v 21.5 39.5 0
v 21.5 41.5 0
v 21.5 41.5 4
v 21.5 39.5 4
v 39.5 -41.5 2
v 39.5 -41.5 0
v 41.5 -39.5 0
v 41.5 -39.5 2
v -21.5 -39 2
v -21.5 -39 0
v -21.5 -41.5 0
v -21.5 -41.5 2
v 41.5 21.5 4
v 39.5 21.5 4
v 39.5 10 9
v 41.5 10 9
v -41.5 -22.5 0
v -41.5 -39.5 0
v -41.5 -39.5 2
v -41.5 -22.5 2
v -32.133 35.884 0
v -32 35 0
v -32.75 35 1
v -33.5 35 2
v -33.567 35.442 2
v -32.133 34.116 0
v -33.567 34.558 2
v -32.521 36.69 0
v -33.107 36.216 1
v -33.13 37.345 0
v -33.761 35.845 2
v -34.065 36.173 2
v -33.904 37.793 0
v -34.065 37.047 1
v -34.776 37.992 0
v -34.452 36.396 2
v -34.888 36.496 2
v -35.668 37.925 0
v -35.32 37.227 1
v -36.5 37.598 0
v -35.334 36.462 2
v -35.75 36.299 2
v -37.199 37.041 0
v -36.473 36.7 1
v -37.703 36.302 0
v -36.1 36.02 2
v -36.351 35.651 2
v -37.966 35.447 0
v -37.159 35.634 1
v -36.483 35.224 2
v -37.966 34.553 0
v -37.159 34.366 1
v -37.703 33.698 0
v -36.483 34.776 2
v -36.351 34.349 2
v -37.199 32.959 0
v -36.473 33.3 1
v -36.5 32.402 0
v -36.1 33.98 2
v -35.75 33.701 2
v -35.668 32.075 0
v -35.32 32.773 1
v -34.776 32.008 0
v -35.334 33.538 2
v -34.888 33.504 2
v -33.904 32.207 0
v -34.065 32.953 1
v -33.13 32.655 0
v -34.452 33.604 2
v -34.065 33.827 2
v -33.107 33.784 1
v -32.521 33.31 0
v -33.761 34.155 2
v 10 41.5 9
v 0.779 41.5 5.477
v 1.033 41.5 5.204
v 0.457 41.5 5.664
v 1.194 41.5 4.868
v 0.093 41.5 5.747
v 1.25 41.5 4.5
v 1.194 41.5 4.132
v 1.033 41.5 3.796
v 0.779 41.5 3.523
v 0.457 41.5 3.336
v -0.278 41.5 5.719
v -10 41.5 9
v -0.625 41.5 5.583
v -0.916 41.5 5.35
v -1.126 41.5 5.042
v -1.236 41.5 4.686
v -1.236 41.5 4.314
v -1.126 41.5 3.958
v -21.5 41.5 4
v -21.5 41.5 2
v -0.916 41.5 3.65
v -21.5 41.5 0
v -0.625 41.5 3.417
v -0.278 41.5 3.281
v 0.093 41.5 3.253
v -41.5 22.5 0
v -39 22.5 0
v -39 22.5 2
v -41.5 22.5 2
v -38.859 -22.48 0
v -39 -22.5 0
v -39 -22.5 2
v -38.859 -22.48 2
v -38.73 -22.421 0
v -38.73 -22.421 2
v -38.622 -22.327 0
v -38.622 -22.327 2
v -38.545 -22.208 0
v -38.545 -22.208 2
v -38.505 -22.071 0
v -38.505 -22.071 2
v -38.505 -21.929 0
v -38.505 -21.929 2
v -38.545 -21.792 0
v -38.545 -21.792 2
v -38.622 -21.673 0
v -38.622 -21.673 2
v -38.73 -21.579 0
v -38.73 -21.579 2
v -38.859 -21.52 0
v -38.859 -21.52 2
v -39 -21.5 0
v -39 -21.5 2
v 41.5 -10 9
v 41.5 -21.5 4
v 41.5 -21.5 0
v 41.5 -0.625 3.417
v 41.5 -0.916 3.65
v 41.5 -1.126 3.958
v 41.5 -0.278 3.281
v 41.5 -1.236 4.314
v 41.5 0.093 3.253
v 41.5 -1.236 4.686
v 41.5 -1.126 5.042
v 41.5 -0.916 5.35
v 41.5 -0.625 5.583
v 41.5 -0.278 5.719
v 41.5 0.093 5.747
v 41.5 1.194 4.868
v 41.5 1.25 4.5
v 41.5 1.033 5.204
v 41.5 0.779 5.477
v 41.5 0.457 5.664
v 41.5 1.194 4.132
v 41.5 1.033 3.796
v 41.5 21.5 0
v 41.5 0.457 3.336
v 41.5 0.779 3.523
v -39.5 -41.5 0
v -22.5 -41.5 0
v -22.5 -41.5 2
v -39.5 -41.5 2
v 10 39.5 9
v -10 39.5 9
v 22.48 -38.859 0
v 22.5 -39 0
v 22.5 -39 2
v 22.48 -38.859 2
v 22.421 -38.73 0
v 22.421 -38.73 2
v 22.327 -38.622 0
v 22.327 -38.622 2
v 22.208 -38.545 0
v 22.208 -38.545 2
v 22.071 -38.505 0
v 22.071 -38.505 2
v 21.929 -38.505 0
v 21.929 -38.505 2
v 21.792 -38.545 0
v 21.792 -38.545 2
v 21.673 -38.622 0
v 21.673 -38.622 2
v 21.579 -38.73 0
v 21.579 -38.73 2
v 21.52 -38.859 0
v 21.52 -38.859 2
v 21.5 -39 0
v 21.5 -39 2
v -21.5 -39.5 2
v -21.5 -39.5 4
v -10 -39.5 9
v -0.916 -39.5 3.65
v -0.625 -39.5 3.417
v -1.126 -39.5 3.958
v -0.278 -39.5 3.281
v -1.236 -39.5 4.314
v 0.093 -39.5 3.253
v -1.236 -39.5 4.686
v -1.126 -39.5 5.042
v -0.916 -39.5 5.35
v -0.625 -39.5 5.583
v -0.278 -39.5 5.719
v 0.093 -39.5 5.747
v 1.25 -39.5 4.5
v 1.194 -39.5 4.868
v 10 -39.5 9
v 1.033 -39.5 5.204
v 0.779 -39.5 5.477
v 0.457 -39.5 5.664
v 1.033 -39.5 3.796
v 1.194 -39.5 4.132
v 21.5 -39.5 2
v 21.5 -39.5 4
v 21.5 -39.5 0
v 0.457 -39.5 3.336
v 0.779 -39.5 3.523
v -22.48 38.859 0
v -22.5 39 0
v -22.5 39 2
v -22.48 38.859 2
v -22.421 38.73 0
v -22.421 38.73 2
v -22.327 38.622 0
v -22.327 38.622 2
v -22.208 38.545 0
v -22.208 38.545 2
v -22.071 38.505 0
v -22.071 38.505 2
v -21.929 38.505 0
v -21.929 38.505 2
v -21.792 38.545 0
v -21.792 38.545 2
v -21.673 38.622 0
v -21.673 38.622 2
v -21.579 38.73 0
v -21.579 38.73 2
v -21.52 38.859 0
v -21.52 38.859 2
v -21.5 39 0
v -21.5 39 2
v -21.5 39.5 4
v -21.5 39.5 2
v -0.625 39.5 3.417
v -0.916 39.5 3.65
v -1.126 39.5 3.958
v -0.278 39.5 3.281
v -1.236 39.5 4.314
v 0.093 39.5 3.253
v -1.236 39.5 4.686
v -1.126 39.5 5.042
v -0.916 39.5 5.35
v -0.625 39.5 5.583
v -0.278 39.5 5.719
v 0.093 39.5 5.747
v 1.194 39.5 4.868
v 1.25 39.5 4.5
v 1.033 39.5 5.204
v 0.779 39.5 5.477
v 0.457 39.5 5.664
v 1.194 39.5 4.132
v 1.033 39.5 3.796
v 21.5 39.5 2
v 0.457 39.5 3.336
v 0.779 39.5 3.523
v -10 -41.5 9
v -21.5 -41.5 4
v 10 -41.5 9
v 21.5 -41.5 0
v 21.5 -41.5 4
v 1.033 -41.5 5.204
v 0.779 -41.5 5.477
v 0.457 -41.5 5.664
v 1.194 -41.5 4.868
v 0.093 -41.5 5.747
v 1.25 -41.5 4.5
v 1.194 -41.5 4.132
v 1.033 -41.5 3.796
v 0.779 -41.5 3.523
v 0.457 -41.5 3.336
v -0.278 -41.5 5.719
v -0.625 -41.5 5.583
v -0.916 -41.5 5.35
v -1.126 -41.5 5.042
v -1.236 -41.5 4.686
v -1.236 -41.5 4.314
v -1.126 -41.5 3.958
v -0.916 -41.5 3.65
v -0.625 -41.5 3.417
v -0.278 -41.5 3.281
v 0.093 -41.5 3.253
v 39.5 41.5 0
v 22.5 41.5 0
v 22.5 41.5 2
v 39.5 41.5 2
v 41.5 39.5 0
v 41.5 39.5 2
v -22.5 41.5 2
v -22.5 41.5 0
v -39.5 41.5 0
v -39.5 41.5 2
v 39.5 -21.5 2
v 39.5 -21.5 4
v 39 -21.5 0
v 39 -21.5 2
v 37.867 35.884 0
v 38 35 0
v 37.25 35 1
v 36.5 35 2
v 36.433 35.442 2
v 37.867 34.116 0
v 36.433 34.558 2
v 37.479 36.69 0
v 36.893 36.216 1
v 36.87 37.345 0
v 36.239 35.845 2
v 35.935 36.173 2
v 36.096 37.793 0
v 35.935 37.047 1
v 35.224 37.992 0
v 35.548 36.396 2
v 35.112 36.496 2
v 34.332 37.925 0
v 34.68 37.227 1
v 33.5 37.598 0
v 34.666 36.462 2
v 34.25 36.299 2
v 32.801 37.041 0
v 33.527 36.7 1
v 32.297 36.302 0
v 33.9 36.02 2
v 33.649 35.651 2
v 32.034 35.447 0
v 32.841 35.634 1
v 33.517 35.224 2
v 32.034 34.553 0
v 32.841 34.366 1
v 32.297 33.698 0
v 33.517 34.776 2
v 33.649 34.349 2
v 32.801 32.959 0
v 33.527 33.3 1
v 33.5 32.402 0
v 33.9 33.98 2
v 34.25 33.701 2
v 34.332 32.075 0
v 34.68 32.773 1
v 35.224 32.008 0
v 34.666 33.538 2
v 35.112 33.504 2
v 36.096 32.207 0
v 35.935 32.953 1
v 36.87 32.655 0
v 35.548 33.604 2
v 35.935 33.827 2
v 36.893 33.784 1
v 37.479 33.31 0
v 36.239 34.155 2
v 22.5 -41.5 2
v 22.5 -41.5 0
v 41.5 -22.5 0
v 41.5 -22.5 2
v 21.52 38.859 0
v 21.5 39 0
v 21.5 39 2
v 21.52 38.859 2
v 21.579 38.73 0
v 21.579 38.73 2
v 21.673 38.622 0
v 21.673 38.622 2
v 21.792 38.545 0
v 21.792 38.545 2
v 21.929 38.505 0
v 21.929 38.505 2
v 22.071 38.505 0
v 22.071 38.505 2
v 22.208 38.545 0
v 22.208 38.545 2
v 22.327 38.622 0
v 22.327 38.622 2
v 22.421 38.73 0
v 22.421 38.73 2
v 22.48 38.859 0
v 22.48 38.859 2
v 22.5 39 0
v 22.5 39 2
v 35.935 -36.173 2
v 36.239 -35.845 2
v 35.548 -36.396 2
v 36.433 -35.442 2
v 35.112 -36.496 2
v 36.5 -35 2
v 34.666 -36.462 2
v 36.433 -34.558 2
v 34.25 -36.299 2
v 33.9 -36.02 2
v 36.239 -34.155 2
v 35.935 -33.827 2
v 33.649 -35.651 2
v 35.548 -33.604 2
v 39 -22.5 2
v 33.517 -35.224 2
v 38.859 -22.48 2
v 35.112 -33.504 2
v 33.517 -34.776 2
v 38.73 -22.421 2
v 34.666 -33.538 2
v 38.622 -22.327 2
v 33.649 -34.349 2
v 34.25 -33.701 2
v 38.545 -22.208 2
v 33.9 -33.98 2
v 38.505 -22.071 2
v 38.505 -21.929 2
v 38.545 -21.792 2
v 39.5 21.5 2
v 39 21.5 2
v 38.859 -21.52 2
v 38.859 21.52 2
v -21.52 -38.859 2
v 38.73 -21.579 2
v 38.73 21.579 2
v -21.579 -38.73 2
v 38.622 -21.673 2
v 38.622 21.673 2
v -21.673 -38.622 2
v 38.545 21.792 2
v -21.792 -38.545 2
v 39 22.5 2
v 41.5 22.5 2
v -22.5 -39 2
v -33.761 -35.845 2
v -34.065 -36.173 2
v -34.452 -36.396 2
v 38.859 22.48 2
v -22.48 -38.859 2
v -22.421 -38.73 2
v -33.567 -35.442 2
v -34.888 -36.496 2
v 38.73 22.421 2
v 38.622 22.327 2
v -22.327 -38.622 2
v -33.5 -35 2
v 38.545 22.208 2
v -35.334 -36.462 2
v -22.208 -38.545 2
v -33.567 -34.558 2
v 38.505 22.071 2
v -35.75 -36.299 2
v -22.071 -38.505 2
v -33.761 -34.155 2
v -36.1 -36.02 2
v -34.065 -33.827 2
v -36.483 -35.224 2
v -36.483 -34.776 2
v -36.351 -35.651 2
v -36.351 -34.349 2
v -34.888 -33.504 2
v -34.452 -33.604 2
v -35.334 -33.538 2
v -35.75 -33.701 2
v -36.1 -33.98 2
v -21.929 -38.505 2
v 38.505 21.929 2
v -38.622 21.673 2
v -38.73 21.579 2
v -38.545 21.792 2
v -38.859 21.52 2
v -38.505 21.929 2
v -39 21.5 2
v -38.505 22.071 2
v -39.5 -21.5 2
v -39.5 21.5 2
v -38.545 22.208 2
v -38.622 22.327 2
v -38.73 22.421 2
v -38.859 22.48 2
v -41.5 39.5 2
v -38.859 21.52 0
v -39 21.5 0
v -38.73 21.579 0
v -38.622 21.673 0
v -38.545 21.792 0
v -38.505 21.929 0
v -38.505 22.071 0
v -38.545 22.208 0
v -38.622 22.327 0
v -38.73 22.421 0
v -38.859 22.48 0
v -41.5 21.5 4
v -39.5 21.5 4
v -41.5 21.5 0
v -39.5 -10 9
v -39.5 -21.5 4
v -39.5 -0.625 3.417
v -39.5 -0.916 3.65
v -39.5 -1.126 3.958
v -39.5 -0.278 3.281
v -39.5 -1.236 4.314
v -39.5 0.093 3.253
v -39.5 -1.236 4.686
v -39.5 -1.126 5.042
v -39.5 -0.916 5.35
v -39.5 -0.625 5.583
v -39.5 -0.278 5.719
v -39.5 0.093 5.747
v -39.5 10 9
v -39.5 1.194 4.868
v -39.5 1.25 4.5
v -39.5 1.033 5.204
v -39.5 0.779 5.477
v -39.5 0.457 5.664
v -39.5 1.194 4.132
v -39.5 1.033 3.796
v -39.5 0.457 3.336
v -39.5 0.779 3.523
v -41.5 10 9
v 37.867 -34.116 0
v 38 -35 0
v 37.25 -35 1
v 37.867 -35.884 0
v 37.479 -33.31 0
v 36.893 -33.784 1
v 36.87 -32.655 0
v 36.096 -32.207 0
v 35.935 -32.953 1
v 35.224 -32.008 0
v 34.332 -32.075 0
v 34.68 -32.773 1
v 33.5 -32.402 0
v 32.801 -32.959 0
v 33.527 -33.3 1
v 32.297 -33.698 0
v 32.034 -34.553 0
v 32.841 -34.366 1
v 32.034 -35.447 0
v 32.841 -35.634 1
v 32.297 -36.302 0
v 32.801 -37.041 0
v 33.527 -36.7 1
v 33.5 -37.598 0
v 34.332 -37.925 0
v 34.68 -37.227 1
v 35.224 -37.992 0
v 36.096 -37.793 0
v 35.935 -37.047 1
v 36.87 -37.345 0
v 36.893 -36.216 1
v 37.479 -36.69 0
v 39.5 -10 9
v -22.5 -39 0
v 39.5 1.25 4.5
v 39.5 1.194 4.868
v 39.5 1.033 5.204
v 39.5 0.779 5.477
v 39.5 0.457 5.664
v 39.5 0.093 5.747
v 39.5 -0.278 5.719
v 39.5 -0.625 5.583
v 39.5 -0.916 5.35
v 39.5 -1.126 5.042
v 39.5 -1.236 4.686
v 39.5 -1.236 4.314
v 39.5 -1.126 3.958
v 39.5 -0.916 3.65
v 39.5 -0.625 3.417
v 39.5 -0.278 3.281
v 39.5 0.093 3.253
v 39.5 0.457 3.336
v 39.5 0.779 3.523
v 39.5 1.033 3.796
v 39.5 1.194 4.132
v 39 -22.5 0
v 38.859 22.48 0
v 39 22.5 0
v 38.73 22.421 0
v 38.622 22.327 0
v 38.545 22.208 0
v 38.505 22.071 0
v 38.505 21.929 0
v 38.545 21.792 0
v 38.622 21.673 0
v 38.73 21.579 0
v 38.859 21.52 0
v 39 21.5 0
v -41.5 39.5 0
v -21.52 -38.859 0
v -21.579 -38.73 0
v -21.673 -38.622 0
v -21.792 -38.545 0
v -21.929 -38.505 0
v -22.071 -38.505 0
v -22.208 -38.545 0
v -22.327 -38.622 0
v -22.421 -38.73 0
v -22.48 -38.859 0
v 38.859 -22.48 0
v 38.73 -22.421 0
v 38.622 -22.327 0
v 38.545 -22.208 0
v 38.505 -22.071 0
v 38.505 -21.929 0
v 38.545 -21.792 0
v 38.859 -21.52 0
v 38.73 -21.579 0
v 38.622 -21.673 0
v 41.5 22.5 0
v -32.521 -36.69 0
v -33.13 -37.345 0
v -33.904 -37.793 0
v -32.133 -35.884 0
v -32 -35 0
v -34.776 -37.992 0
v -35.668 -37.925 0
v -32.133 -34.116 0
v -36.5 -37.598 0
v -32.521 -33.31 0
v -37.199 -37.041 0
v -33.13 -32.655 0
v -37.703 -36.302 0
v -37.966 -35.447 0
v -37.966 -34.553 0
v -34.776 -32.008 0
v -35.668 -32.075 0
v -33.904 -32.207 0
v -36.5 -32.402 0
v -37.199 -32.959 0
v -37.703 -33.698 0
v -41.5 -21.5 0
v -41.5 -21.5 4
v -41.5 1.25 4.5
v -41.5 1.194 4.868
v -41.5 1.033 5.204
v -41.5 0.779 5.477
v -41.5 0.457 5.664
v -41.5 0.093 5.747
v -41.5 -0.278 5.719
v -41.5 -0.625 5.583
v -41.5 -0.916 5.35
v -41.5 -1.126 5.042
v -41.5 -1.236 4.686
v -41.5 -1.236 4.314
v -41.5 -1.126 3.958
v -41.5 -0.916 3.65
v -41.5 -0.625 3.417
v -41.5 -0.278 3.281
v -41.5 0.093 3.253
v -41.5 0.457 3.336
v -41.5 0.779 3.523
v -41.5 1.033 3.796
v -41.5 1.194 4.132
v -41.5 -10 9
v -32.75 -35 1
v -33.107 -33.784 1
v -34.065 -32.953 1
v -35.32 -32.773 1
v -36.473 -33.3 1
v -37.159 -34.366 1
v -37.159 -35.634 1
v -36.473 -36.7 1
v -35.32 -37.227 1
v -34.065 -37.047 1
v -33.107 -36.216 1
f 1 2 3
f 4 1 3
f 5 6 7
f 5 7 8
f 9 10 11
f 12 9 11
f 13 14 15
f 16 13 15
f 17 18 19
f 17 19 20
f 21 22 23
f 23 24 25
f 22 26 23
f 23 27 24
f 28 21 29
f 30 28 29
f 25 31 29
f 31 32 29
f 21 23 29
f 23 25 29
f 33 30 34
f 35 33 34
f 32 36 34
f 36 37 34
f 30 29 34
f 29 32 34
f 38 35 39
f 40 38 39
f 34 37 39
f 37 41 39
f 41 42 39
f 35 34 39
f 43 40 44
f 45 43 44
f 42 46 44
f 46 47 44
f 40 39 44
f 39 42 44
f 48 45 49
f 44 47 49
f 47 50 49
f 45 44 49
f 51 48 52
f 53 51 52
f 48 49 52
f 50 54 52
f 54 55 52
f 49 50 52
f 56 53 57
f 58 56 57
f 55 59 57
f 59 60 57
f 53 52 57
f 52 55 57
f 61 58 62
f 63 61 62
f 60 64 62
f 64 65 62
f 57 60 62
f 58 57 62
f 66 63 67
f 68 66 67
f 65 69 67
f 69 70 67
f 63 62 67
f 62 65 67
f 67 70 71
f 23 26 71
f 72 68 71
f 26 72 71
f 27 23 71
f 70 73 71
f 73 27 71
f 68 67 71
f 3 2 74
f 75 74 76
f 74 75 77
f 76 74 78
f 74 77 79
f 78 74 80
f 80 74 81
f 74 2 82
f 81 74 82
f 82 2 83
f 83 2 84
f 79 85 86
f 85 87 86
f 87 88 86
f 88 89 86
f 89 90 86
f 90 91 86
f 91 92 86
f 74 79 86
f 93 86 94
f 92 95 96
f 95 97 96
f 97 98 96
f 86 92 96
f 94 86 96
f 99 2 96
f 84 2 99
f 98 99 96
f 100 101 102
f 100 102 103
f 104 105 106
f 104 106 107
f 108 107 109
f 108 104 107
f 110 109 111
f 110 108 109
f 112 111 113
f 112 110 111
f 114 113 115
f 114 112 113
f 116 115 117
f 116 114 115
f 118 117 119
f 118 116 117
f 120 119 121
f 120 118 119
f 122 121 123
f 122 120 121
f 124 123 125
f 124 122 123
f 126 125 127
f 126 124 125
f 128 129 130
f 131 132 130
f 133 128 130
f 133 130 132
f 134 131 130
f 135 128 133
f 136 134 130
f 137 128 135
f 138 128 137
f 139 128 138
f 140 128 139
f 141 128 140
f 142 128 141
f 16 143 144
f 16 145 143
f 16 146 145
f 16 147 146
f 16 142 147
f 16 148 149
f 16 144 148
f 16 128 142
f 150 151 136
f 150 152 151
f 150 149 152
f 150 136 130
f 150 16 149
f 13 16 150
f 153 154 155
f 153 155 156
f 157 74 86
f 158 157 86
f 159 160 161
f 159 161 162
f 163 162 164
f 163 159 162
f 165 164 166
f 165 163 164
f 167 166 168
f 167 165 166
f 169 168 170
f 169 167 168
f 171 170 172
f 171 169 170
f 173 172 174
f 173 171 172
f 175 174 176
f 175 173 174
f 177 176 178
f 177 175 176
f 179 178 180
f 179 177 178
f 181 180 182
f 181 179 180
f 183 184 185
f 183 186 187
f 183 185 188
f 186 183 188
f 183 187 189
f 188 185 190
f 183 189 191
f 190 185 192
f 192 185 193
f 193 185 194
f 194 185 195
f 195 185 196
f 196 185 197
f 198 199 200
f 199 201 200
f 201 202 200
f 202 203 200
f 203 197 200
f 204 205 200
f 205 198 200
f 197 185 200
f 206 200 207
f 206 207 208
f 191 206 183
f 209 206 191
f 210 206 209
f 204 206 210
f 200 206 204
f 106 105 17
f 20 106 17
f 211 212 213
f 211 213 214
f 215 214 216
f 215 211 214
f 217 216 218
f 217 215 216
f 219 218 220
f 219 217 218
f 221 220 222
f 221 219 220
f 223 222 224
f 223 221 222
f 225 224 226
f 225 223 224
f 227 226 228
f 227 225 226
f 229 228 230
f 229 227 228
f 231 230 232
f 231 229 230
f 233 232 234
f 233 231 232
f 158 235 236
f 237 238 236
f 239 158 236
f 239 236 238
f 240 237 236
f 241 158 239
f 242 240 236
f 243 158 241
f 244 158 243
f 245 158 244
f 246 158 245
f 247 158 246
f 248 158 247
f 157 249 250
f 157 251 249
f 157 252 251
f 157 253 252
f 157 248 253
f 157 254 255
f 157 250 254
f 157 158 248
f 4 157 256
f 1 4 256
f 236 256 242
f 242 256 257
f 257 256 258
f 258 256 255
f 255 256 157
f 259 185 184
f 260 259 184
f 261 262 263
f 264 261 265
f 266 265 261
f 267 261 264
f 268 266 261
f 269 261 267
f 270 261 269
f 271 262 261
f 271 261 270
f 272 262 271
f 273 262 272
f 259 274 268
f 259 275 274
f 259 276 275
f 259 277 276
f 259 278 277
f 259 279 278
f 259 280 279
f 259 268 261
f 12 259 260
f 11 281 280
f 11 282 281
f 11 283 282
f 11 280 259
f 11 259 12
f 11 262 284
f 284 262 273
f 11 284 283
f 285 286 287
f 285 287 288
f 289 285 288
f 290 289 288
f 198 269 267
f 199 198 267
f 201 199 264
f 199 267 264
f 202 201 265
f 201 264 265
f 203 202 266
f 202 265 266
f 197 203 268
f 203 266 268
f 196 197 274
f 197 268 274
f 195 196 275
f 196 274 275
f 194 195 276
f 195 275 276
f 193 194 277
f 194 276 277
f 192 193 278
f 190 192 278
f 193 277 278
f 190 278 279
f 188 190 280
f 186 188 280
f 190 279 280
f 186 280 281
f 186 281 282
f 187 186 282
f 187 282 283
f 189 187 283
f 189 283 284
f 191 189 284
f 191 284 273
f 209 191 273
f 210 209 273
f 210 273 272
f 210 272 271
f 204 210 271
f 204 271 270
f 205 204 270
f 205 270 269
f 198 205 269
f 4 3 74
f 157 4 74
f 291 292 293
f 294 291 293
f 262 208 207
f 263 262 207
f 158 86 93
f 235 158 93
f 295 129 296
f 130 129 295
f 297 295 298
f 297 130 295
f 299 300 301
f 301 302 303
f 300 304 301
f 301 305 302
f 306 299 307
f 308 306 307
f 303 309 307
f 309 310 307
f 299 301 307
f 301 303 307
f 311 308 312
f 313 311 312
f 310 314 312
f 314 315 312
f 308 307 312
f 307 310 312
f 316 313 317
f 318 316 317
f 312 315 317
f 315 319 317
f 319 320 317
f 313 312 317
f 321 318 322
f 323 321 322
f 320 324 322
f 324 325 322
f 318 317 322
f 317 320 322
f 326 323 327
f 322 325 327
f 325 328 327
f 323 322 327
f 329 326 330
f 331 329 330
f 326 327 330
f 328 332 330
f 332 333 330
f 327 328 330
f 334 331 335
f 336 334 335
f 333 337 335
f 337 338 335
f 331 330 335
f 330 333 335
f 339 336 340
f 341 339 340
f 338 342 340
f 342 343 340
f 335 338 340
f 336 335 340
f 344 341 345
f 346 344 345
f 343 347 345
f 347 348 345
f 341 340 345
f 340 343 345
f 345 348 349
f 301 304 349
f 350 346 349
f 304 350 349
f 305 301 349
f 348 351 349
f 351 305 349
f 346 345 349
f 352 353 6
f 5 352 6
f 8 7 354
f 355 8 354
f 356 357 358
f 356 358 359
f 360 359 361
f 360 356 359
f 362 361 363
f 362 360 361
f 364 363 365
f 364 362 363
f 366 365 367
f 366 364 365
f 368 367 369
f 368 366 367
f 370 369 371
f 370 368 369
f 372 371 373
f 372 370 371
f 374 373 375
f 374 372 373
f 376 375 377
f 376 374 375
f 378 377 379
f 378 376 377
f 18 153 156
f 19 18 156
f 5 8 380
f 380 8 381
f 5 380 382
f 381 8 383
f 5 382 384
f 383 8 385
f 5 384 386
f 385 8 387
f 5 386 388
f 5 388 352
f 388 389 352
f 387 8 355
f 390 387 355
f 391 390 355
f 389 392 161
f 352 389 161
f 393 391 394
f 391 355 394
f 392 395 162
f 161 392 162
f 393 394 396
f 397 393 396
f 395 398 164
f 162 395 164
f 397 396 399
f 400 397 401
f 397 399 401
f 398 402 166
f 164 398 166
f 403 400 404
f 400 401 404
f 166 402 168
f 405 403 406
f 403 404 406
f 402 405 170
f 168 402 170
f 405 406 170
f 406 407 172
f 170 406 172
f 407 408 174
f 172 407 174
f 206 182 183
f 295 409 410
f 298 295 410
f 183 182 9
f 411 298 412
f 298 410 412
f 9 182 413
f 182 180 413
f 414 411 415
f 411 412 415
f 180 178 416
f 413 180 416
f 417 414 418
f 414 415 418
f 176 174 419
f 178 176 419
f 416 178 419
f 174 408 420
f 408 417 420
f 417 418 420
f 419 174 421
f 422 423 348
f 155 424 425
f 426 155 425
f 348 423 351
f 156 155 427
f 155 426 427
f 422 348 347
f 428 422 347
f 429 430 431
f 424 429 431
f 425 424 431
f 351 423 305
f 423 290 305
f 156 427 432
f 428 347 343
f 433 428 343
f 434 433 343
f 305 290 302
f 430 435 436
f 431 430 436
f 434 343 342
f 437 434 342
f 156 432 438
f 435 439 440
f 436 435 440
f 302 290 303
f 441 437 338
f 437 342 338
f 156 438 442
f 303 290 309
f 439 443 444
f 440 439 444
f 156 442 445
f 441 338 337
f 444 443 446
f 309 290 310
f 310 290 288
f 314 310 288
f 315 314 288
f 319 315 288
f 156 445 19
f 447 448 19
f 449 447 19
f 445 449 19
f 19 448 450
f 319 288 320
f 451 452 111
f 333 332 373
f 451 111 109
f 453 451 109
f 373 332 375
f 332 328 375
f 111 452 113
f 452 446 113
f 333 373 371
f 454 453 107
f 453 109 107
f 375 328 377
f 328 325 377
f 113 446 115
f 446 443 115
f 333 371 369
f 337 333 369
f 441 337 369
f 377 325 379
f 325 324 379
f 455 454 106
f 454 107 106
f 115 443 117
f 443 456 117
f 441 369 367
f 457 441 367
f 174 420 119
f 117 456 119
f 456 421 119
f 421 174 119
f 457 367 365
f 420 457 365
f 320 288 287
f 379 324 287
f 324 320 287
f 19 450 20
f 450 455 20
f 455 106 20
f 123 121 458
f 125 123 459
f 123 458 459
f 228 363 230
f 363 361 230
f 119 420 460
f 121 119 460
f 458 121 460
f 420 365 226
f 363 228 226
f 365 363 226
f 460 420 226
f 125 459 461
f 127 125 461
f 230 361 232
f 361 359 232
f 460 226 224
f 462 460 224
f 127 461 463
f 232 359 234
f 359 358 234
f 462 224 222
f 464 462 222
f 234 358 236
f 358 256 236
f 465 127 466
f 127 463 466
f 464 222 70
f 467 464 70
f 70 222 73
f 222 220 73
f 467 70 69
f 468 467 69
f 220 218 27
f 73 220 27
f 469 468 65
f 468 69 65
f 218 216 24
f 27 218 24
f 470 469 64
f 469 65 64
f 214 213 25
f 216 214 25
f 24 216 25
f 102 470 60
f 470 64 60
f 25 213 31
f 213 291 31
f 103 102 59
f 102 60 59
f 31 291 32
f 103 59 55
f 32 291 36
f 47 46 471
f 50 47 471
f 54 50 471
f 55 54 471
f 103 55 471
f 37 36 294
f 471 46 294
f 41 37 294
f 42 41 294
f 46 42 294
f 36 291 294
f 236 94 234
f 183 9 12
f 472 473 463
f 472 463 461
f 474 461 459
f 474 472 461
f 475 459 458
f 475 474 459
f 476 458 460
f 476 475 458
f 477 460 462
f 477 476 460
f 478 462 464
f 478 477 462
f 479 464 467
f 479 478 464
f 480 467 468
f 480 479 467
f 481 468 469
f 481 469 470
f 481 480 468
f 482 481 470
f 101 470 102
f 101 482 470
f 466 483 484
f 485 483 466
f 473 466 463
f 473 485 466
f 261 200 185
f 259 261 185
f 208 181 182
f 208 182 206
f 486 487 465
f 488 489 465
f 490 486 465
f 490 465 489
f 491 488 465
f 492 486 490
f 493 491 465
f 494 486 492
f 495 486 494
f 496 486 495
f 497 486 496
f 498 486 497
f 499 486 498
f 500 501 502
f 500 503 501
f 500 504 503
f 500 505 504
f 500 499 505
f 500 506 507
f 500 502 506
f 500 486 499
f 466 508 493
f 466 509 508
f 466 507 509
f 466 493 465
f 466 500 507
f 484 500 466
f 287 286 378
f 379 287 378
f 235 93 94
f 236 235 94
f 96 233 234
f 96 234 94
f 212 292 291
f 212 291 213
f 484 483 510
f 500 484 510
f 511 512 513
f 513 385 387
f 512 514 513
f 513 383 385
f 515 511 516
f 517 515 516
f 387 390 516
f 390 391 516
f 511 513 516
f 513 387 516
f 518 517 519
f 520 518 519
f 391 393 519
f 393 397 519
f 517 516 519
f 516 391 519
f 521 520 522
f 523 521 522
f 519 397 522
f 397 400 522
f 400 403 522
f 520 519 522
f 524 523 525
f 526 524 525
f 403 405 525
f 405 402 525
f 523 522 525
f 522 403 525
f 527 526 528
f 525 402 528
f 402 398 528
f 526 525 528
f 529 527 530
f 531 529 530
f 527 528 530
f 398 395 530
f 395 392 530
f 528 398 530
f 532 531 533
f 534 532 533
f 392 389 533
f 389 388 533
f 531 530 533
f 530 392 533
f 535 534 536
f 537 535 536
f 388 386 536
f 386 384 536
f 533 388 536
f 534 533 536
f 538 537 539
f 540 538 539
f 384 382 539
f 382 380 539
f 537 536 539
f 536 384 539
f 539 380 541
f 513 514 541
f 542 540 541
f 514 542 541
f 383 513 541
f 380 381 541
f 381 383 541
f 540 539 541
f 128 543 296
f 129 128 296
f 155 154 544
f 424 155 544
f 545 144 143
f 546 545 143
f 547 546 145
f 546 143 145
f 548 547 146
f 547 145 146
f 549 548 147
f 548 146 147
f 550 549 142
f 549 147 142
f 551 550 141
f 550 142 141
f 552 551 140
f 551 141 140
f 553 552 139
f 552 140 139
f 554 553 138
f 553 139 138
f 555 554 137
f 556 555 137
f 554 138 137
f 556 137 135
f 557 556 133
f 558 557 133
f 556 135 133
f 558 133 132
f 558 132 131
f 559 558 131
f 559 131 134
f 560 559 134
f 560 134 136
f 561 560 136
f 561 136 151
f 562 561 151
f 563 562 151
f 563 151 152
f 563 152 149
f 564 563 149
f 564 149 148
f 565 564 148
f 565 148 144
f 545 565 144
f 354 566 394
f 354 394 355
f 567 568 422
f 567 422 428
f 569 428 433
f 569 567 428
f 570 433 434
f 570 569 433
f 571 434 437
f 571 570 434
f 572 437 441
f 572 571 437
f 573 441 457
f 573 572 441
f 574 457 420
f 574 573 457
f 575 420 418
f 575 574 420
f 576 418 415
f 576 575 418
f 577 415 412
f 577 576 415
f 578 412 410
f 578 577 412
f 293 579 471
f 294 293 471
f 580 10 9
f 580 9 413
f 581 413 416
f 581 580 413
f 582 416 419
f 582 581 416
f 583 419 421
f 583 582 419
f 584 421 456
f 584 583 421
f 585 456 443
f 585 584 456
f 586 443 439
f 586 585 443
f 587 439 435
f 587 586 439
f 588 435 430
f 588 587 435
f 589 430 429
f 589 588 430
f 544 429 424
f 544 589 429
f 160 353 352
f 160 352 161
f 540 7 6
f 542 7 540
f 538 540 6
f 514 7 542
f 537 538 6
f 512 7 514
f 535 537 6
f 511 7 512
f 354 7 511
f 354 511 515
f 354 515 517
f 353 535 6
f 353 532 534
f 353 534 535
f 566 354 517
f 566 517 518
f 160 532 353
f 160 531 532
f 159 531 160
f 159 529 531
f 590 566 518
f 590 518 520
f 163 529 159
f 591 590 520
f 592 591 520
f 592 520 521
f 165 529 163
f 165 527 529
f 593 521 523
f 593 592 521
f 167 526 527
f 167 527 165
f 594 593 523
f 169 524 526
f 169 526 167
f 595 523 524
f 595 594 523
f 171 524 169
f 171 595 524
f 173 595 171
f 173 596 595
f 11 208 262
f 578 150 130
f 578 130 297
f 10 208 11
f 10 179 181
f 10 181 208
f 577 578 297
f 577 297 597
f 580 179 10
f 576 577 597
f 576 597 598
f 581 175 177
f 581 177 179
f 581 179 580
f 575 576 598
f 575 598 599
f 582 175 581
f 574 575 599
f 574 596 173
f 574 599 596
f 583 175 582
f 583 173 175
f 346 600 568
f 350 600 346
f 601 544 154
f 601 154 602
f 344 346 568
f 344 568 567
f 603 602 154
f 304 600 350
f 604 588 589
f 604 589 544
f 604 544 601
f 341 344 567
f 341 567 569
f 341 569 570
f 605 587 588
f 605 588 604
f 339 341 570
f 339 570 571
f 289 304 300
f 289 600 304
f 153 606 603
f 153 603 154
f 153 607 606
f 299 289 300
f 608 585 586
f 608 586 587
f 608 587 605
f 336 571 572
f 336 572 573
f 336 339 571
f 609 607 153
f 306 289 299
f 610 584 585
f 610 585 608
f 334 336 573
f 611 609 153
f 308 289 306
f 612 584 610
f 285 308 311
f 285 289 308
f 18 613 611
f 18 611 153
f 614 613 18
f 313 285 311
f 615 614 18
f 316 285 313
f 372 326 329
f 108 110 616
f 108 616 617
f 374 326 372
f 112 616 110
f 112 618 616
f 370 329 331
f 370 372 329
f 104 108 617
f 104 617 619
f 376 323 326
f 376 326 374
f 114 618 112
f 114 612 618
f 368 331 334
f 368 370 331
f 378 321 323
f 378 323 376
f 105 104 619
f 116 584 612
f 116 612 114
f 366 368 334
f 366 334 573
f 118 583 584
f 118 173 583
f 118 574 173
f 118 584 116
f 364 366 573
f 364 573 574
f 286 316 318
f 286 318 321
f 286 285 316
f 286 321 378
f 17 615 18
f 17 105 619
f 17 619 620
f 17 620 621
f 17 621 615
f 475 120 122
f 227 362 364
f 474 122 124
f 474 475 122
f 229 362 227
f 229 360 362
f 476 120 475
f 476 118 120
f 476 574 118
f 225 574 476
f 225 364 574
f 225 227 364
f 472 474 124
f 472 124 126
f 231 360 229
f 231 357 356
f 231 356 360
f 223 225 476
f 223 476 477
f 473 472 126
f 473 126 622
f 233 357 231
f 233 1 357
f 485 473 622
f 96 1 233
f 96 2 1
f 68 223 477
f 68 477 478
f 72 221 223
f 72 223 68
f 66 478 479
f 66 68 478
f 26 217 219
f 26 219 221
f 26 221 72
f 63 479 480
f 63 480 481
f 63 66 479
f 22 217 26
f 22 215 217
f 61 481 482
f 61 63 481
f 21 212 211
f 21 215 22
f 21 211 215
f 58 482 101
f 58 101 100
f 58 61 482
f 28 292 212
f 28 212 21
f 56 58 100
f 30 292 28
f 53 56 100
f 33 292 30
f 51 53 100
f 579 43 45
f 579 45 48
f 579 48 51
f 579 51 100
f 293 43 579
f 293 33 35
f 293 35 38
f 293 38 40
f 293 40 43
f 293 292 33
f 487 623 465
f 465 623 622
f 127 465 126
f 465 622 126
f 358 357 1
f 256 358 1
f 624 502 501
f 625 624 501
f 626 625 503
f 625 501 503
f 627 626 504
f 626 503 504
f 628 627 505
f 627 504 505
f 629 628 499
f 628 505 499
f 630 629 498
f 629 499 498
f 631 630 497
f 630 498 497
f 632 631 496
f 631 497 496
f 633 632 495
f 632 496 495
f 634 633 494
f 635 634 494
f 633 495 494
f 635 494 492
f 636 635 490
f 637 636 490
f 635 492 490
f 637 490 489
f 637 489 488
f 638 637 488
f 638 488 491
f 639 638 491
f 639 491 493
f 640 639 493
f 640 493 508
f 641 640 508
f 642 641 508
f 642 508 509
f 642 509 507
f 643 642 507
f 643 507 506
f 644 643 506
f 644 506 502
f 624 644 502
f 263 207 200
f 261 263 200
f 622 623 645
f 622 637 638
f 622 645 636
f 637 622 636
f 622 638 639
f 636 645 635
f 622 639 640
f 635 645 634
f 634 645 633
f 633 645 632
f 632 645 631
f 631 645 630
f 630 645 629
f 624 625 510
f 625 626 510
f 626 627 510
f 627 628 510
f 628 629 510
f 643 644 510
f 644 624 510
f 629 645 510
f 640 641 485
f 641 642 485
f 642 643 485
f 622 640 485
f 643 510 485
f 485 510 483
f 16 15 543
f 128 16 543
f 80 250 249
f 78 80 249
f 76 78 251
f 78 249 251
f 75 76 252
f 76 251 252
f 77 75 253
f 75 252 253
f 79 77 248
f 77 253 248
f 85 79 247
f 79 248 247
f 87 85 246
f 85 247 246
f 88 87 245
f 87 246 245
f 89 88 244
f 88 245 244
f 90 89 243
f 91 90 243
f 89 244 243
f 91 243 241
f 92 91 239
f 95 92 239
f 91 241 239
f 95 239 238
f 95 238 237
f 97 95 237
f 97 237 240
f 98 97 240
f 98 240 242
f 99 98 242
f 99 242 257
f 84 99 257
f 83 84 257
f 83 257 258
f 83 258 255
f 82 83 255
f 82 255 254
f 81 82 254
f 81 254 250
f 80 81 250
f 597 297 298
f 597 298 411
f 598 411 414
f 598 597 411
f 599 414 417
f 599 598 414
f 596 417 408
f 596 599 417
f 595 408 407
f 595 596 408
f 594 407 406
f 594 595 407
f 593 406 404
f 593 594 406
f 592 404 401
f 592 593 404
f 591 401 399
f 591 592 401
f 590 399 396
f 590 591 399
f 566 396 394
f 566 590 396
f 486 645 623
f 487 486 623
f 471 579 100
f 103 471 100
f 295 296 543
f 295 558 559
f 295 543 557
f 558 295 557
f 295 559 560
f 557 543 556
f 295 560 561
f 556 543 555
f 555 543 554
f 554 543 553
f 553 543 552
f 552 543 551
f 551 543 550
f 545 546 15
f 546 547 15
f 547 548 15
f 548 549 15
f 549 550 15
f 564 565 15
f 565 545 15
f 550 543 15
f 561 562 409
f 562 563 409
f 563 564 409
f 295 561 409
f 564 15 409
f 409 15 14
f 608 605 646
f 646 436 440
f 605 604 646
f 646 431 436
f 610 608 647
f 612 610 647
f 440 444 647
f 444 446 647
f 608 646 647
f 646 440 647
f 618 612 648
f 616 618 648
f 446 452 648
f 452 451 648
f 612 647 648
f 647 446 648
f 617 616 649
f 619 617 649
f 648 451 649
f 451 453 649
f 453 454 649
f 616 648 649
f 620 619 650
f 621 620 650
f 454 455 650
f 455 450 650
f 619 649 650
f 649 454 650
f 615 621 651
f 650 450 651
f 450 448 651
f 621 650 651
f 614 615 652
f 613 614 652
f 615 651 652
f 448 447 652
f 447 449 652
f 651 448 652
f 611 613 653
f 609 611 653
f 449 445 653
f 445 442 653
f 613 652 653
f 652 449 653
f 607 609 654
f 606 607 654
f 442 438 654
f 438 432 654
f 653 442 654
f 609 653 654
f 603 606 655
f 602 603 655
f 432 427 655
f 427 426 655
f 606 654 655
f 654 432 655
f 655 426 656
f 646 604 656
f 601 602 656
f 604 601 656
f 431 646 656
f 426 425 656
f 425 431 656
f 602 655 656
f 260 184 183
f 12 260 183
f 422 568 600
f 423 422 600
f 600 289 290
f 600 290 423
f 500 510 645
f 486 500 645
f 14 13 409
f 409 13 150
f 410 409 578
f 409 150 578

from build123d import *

# Parameters (mm, degrees)
PAD003_DEPTH    = 2
SKETCH003_R     = 3
SKETCH004_R     = 1.5
SKETCH005_R     = 3
SKETCH006_R     = 1.5
SKETCH007_R     = 3
SKETCH008_R     = 1.5
SKETCH001_R     = 3
SKETCH002_R     = 1.5
PAD_DEPTH       = 2
CHAMFER_SIZE    = 2
PAD004_DEPTH    = 2
PAD001_DEPTH    = 2
PAD002_DEPTH    = 2
SKETCH013_R     = 1.25
POCKET_DEPTH    = 83.001
SKETCH014_R     = 1.25
POCKET001_DEPTH = 83.001002


with BuildPart() as pad003:
    # Sketch011 → Pad003 (new body)
    with BuildSketch(Plane.YZ.offset(39.5)):
        Polygon((-21.5, 0), (21.5, 0), (21.5, 4), (10, 9), (-10, 9), (-21.5, 4), align=None)
    extrude(amount=PAD003_DEPTH)


with BuildPart() as loft001:
    # Sketch003 → Loft001 section 0
    with BuildSketch(Plane.XY):
        with Locations((35, -35)):
            Circle(SKETCH003_R)
    # Sketch004 → Loft001 section 1
    with BuildSketch(Plane.XY.offset(2)):
        with Locations((35, -35)):
            Circle(SKETCH004_R)
    loft(ruled=True)


with BuildPart() as loft002:
    # Sketch005 → Loft002 section 0
    with BuildSketch(Plane.XY):
        with Locations((-35, 35)):
            Circle(SKETCH005_R)
    # Sketch006 → Loft002 section 1
    with BuildSketch(Plane.XY.offset(2)):
        with Locations((-35, 35)):
            Circle(SKETCH006_R)
    loft(ruled=True)


with BuildPart() as loft003:
    # Sketch007 → Loft003 section 0
    with BuildSketch(Plane.XY):
        with Locations((35, 35)):
            Circle(SKETCH007_R)
    # Sketch008 → Loft003 section 1
    with BuildSketch(Plane.XY.offset(2)):
        with Locations((35, 35)):
            Circle(SKETCH008_R)
    loft(ruled=True)


with BuildPart() as loft_body:
    # Sketch001 → Loft section 0
    with BuildSketch(Plane.XY):
        with Locations((-35, -35)):
            Circle(SKETCH001_R)
    # Sketch002 → Loft section 1
    with BuildSketch(Plane.XY.offset(2)):
        with Locations((-35, -35)):
            Circle(SKETCH002_R)
    loft(ruled=True)


with BuildPart() as cut003:
    # Sketch → Pad (new body)
    with BuildSketch(Plane.XY):
        with BuildLine():
            Line((21.499998, -41.5), (-21.500002, -41.5))
            Line((-21.500002, -39), (-21.500002, -41.5))
            ThreePointArc((-21.500002, -39), (-22.000002, -38.5), (-22.500002, -39))
            Line((-22.500002, -41.5), (-22.500002, -39))
            Line((-22.500002, -41.5), (-41.500002, -41.5))
            Line((-41.500002, -41.5), (-41.500002, -22.5))
            Line((-39.000002, -22.5), (-41.500002, -22.5))
            ThreePointArc((-39.000002, -22.5), (-38.500001, -22.000001), (-39, -21.5))
            Line((-41.5, -21.5), (-39, -21.5))
            Line((-41.5, -21.5), (-41.5, 21.5))
            Line((-41.5, 21.5), (-39, 21.5))
            ThreePointArc((-39, 21.5), (-38.5, 22.000001), (-39.000002, 22.5))
            Line((-39.000002, 22.5), (-41.500002, 22.5))
            Line((-41.500002, 41.5), (-41.500002, 22.5))
            Line((-22.500002, 41.5), (-41.500002, 41.5))
            Line((-22.500002, 41.5), (-22.500002, 39))
            ThreePointArc((-22.500002, 39), (-22.000002, 38.5), (-21.500002, 39))
            Line((-21.500002, 39), (-21.500002, 41.5))
            Line((21.499998, 41.5), (-21.500002, 41.5))
            Line((21.499998, 39), (21.499998, 41.5))
            ThreePointArc((21.499998, 39), (21.999998, 38.5), (22.499998, 39))
            Line((22.499998, 41.5), (22.499998, 39))
            Line((22.499998, 41.5), (41.499998, 41.5))
            Line((41.499998, 41.5), (41.499998, 22.5))
            Line((38.999998, 22.5), (41.499998, 22.5))
            ThreePointArc((38.999998, 22.5), (38.499996, 21.999999), (39, 21.5))
            Line((41.5, 21.5), (39, 21.5))
            Line((41.5, -21.5), (41.5, 21.5))
            Line((41.5, -21.5), (39, -21.5))
            ThreePointArc((39, -21.5), (38.500002, -21.999999), (38.999998, -22.5))
            Line((38.999998, -22.5), (41.499998, -22.5))
            Line((41.499998, -41.5), (41.499998, -22.5))
            Line((22.499998, -41.5), (41.499998, -41.5))
            Line((22.499998, -41.5), (22.499998, -39))
            ThreePointArc((22.499998, -39), (21.999998, -38.5), (21.499998, -39))
            Line((21.499998, -39), (21.499998, -41.5))
        make_face()
    extrude(amount=PAD_DEPTH)

    # Chamfer
    chamfer_edges = [cut003.edges().sort_by_distance(p)[0] for p in [
        (-41.500002, -41.5, 1),
        (-41.500002, 41.5, 1),
        (41.499998, -41.5, 1),
        (41.499998, 41.5, 1),
    ]]
    chamfer(chamfer_edges, length=CHAMFER_SIZE)

    # Cut: cut Loft body
    add(loft_body.part, mode=Mode.SUBTRACT)

    # Cut001: cut Loft003
    add(loft003.part, mode=Mode.SUBTRACT)

    # Cut002: cut Loft002
    add(loft002.part, mode=Mode.SUBTRACT)

    # Cut003: cut Loft001
    add(loft001.part, mode=Mode.SUBTRACT)


with BuildPart() as fusion:
    # Sketch012 → Pad004 (new body)
    with BuildSketch(Plane.YZ.offset(-41.5)):
        Polygon((-21.5, 0), (21.5, 0), (21.5, 4), (10, 9), (-10, 9), (-21.5, 4), align=None)
    extrude(amount=PAD004_DEPTH)

    # Fusion: union Cut003
    add(cut003.part)


with BuildPart() as pad001:
    # Sketch009 → Pad001 (new body)
    with BuildSketch(Plane.XZ.offset(39.5)):
        Polygon((-21.5, 0), (21.5, 0), (21.5, 4), (10, 9), (-10, 9), (-21.5, 4), align=None)
    extrude(amount=PAD001_DEPTH)


with BuildPart() as pocket001:
    # Sketch010 → Pad002 (new body)
    with BuildSketch(Plane.XZ.offset(-41.5)):
        Polygon((-21.5, 0), (21.5, 0), (21.5, 4), (10, 9), (-10, 9), (-21.5, 4), align=None)
    extrude(amount=PAD002_DEPTH)

    # Fusion001: union Pad003, Fusion, Pad001
    add(pad003.part)
    add(fusion.part)
    add(pad001.part)

    # Sketch013 → Pocket (cut, through all)
    with BuildSketch(Plane.XZ.offset(41.5)):
        with Locations((0, 4.5)):
            Circle(SKETCH013_R)
    extrude(amount=-POCKET_DEPTH, mode=Mode.SUBTRACT)

    # Sketch014 → Pocket001 (cut, through all)
    with BuildSketch(Plane.YZ.offset(41.5)):
        with Locations((0, 4.5)):
            Circle(SKETCH014_R)
    extrude(amount=-POCKET001_DEPTH, mode=Mode.SUBTRACT)


solid = pocket001.part
